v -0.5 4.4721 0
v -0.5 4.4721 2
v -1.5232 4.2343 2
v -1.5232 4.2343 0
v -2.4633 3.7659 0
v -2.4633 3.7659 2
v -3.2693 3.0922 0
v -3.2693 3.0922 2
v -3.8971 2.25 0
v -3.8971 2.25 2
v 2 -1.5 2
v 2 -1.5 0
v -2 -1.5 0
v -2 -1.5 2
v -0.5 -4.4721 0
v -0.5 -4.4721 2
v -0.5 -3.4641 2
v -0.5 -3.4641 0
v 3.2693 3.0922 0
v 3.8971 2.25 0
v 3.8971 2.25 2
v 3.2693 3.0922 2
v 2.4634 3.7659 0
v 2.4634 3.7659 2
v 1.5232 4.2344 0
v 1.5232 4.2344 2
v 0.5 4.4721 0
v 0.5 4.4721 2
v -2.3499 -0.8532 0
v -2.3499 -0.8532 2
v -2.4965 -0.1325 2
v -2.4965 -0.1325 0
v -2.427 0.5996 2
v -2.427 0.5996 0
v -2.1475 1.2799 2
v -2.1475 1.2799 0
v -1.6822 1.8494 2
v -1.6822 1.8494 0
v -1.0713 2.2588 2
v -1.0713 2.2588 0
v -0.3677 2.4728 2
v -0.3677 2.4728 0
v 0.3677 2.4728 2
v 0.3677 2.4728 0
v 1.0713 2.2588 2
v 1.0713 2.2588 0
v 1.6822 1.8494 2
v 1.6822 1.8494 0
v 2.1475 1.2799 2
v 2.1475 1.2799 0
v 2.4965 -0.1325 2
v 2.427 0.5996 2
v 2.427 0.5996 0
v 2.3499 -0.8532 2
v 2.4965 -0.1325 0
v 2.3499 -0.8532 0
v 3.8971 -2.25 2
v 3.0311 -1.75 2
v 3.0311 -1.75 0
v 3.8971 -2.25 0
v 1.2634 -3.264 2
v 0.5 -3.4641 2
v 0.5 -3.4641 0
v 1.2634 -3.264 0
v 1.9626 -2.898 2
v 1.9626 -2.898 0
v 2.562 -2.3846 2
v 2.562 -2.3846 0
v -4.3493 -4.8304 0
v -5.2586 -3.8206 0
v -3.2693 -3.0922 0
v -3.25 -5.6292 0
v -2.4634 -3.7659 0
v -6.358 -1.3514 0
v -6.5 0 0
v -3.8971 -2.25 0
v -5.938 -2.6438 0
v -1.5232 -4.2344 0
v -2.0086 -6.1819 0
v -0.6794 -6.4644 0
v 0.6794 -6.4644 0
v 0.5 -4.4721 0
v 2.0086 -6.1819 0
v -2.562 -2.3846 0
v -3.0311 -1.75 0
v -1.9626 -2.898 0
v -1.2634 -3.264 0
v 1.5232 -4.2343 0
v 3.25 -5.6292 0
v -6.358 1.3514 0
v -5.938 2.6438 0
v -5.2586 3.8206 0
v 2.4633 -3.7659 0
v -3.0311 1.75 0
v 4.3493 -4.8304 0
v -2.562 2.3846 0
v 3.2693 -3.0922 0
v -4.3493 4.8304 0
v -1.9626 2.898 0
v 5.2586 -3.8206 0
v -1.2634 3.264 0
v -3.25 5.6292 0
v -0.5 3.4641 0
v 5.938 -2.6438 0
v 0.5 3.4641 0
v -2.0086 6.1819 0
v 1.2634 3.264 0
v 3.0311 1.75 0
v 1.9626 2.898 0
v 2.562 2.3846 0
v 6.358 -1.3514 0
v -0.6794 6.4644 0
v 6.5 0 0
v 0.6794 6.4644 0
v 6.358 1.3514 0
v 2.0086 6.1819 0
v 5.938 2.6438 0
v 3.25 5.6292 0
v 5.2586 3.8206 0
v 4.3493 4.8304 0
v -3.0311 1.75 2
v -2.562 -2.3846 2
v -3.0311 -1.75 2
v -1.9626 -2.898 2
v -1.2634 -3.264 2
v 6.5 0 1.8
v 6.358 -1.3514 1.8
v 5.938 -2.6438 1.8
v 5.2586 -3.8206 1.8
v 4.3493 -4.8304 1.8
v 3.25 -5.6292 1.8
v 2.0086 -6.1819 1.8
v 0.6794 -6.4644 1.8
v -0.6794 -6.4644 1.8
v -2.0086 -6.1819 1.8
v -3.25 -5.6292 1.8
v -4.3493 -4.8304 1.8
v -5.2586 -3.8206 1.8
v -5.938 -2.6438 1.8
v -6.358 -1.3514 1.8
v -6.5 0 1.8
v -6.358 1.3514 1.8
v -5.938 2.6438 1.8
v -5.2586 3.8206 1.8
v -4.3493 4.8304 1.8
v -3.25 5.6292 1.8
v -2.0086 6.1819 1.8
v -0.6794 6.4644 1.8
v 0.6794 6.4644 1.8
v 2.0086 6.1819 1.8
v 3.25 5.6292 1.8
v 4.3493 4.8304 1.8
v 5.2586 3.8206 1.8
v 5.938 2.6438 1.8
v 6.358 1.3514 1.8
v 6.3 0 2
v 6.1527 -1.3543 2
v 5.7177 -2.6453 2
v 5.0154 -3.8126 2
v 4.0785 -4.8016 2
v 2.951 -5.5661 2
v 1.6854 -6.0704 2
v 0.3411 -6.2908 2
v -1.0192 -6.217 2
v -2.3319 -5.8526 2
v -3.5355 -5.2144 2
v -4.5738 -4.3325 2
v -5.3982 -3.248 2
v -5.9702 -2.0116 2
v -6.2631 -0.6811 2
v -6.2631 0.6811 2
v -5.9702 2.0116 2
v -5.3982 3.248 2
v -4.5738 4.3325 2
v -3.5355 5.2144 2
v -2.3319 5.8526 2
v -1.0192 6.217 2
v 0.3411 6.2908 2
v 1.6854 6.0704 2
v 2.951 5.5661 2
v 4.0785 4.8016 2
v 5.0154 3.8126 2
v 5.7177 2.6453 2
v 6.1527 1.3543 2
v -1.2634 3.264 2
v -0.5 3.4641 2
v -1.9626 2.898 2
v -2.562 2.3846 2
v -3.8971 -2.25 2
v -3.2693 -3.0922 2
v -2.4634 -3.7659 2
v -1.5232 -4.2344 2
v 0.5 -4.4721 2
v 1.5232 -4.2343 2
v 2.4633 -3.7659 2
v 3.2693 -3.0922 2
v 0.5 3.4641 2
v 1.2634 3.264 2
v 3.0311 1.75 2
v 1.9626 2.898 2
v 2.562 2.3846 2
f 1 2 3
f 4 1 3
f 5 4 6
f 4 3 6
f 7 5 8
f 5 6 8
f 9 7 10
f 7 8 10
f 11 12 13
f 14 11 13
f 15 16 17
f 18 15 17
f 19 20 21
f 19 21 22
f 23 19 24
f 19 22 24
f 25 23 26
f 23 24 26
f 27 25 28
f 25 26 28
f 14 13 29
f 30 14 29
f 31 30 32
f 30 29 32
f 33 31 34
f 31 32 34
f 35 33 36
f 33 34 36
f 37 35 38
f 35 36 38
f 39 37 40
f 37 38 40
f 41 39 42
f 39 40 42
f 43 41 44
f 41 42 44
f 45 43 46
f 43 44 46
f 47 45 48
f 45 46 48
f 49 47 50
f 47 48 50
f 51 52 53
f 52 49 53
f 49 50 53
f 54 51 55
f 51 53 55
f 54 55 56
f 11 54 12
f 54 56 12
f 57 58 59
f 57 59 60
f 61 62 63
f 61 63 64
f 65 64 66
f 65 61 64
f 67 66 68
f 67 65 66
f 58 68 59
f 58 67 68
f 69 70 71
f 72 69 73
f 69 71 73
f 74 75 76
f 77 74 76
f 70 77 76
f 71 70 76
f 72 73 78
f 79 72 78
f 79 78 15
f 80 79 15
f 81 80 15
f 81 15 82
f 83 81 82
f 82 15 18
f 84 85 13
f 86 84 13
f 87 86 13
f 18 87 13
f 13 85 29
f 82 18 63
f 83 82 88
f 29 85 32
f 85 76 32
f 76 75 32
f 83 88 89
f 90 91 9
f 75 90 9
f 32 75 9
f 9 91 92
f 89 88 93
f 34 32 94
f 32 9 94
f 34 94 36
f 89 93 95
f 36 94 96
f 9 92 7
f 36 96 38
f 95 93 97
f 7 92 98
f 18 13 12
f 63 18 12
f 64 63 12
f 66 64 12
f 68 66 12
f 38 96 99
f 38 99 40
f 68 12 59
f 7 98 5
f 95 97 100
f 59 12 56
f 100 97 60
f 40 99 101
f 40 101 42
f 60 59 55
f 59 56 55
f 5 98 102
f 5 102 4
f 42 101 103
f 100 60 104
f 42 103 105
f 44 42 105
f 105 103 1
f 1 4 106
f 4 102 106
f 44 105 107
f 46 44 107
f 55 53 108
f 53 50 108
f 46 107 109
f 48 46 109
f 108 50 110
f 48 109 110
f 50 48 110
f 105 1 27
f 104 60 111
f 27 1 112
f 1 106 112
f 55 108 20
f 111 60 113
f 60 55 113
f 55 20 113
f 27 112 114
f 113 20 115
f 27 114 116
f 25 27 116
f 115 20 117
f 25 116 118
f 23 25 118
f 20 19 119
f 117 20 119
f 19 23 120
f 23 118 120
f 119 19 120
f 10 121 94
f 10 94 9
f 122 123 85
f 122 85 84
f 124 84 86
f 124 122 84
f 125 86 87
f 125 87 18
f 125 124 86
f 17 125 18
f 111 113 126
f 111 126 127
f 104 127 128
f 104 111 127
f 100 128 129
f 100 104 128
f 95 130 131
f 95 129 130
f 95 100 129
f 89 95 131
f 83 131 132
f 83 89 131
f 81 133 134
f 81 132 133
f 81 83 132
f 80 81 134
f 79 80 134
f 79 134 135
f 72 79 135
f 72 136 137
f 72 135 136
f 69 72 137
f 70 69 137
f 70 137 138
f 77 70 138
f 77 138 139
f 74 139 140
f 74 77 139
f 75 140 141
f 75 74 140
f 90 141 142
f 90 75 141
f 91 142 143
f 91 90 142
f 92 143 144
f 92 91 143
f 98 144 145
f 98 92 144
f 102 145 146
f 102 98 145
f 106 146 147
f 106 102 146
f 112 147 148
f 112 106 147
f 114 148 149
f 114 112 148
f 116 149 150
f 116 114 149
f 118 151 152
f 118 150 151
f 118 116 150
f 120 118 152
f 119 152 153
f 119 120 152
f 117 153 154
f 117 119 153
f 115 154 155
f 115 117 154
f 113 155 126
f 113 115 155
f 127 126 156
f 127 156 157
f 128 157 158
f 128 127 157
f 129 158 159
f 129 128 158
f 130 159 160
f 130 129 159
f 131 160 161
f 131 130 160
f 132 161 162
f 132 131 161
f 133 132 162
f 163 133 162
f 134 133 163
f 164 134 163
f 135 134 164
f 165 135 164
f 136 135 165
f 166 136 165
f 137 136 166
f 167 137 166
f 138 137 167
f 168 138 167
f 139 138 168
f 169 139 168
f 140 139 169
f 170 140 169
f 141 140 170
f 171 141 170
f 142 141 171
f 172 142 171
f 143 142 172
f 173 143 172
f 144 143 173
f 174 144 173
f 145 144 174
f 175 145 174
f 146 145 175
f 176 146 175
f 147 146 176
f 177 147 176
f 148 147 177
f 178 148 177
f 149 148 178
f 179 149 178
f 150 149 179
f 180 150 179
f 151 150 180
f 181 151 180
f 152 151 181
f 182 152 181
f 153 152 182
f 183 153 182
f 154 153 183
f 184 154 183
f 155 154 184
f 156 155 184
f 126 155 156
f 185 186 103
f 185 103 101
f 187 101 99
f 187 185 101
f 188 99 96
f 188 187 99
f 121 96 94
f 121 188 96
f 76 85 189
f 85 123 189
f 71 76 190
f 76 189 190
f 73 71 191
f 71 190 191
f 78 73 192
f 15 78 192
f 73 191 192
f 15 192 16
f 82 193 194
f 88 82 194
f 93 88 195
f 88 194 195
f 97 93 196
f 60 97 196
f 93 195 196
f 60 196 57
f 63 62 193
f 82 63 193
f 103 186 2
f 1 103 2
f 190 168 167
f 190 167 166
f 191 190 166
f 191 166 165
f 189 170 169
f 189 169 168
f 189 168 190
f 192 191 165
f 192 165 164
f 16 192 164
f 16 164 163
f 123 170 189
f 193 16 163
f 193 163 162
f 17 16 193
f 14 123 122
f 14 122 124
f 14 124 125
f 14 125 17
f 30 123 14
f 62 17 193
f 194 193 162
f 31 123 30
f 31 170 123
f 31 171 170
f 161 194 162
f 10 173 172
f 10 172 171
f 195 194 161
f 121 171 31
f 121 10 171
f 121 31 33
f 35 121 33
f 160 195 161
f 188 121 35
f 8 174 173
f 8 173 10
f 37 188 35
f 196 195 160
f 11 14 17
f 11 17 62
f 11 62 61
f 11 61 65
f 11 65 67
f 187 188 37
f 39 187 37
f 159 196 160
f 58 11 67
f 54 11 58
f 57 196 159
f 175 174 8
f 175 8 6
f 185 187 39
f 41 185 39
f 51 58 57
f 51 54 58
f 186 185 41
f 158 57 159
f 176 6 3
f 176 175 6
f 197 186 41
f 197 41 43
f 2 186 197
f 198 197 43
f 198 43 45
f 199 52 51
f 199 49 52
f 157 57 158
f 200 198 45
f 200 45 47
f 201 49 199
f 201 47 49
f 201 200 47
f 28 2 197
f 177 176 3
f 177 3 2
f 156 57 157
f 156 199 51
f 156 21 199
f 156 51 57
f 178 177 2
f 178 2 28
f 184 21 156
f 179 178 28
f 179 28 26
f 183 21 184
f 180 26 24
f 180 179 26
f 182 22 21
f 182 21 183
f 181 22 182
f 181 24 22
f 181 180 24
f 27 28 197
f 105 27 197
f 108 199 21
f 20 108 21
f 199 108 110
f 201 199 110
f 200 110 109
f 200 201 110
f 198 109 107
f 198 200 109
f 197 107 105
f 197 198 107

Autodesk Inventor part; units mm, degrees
ref_plane "YZ Plane" through (0, 0, 0) normal (1, 0, 0) x (0, 1, 0)
ref_plane "XZ Plane" through (0, 0, 0) normal (0, 1, 0) x (-1, 0, 0)
ref_plane "XY Plane" through (0, 0, 0) normal (0, 0, 1) x (1, 0, 0)
sketch "スケッチ1" plane through (0, 0, 0) normal (0, 0, 1) x (1, 0, 0)
  circle A0 centre (0, 0) radius 6.5
  arc A1 (2, -1.5) -> (-2, -1.5) centre (0, 0) ccw
  line L0 (2, -1.5) -> (-2, -1.5)
  arc A2 (-2, -1.5) -> (2, -1.5) centre (0, 0) ccw
  dimension "d0" = 13
  dimension "d1" = 5
  dimension "d2" = 4
extrude "押し出し1" add sketch "スケッチ1" along normal blind 2 contours A0 | A2 L0
sketch "スケッチ2" plane through (0, 0, 2) normal (0, 0, 1) x (1, 0, 0)
  circle A0 centre (0, 0) radius 6.5 projected
  line L0 (0.5, -6.5) -> (0, -6.5)
  line L1 (0, -6.5) -> (-0.5, -6.5)
  arc A1 (2, -1.5) -> (-2, -1.5) centre (0, 0) ccw projected
  arc A2 (3.8971, 2.25) -> (0.5, 4.4721) centre (0, 0) ccw
  arc A3 (3.0311, 1.75) -> (0.5, 3.4641) centre (0, 0) ccw
  arc A4 (-0.5, 4.4721) -> (-3.8971, 2.25) centre (0, 0) ccw
  arc A5 (-0.5, 3.4641) -> (-3.0311, 1.75) centre (0, 0) ccw
  arc A6 (0.5, -3.4641) -> (3.0311, -1.75) centre (0, 0) ccw
  arc A7 (-3.0311, -1.75) -> (-0.5, -3.4641) centre (0, 0) ccw
  arc A8 (-3.8971, -2.25) -> (-0.5, -4.4721) centre (0, 0) ccw
  arc A9 (0.5, -4.4721) -> (3.8971, -2.25) centre (0, 0) ccw
  line L2 (-3.0311, 1.75) -> (-3.8971, 2.25)
  line L3 (-0.5, 3.4641) -> (-0.5, 4.4721)
  line L4 (0.5, 4.4721) -> (0.5, 3.4641)
  line L5 (3.0311, 1.75) -> (3.8971, 2.25)
  line L6 (-3.0311, -1.75) -> (-3.8971, -2.25)
  line L7 (3.0311, -1.75) -> (3.8971, -2.25)
  line L8 (-0.5, -4.4721) -> (-0.5, -3.4641)
  line L9 (0.5, -3.4641) -> (0.5, -4.4721)
extrude "押し出し2" cut sketch "スケッチ2" against normal through all contours L5 A3 L4 A2 | L3 A5 L2 A4 | A6 L7 A9 L9 | A7 L8 A8 L6
chamfer "面取り1" distance 0.2 angle 45 1 edges at (-6.5, 0, 2)
properties part number "SLIPRING_SRG-1-6G_シャフト"
